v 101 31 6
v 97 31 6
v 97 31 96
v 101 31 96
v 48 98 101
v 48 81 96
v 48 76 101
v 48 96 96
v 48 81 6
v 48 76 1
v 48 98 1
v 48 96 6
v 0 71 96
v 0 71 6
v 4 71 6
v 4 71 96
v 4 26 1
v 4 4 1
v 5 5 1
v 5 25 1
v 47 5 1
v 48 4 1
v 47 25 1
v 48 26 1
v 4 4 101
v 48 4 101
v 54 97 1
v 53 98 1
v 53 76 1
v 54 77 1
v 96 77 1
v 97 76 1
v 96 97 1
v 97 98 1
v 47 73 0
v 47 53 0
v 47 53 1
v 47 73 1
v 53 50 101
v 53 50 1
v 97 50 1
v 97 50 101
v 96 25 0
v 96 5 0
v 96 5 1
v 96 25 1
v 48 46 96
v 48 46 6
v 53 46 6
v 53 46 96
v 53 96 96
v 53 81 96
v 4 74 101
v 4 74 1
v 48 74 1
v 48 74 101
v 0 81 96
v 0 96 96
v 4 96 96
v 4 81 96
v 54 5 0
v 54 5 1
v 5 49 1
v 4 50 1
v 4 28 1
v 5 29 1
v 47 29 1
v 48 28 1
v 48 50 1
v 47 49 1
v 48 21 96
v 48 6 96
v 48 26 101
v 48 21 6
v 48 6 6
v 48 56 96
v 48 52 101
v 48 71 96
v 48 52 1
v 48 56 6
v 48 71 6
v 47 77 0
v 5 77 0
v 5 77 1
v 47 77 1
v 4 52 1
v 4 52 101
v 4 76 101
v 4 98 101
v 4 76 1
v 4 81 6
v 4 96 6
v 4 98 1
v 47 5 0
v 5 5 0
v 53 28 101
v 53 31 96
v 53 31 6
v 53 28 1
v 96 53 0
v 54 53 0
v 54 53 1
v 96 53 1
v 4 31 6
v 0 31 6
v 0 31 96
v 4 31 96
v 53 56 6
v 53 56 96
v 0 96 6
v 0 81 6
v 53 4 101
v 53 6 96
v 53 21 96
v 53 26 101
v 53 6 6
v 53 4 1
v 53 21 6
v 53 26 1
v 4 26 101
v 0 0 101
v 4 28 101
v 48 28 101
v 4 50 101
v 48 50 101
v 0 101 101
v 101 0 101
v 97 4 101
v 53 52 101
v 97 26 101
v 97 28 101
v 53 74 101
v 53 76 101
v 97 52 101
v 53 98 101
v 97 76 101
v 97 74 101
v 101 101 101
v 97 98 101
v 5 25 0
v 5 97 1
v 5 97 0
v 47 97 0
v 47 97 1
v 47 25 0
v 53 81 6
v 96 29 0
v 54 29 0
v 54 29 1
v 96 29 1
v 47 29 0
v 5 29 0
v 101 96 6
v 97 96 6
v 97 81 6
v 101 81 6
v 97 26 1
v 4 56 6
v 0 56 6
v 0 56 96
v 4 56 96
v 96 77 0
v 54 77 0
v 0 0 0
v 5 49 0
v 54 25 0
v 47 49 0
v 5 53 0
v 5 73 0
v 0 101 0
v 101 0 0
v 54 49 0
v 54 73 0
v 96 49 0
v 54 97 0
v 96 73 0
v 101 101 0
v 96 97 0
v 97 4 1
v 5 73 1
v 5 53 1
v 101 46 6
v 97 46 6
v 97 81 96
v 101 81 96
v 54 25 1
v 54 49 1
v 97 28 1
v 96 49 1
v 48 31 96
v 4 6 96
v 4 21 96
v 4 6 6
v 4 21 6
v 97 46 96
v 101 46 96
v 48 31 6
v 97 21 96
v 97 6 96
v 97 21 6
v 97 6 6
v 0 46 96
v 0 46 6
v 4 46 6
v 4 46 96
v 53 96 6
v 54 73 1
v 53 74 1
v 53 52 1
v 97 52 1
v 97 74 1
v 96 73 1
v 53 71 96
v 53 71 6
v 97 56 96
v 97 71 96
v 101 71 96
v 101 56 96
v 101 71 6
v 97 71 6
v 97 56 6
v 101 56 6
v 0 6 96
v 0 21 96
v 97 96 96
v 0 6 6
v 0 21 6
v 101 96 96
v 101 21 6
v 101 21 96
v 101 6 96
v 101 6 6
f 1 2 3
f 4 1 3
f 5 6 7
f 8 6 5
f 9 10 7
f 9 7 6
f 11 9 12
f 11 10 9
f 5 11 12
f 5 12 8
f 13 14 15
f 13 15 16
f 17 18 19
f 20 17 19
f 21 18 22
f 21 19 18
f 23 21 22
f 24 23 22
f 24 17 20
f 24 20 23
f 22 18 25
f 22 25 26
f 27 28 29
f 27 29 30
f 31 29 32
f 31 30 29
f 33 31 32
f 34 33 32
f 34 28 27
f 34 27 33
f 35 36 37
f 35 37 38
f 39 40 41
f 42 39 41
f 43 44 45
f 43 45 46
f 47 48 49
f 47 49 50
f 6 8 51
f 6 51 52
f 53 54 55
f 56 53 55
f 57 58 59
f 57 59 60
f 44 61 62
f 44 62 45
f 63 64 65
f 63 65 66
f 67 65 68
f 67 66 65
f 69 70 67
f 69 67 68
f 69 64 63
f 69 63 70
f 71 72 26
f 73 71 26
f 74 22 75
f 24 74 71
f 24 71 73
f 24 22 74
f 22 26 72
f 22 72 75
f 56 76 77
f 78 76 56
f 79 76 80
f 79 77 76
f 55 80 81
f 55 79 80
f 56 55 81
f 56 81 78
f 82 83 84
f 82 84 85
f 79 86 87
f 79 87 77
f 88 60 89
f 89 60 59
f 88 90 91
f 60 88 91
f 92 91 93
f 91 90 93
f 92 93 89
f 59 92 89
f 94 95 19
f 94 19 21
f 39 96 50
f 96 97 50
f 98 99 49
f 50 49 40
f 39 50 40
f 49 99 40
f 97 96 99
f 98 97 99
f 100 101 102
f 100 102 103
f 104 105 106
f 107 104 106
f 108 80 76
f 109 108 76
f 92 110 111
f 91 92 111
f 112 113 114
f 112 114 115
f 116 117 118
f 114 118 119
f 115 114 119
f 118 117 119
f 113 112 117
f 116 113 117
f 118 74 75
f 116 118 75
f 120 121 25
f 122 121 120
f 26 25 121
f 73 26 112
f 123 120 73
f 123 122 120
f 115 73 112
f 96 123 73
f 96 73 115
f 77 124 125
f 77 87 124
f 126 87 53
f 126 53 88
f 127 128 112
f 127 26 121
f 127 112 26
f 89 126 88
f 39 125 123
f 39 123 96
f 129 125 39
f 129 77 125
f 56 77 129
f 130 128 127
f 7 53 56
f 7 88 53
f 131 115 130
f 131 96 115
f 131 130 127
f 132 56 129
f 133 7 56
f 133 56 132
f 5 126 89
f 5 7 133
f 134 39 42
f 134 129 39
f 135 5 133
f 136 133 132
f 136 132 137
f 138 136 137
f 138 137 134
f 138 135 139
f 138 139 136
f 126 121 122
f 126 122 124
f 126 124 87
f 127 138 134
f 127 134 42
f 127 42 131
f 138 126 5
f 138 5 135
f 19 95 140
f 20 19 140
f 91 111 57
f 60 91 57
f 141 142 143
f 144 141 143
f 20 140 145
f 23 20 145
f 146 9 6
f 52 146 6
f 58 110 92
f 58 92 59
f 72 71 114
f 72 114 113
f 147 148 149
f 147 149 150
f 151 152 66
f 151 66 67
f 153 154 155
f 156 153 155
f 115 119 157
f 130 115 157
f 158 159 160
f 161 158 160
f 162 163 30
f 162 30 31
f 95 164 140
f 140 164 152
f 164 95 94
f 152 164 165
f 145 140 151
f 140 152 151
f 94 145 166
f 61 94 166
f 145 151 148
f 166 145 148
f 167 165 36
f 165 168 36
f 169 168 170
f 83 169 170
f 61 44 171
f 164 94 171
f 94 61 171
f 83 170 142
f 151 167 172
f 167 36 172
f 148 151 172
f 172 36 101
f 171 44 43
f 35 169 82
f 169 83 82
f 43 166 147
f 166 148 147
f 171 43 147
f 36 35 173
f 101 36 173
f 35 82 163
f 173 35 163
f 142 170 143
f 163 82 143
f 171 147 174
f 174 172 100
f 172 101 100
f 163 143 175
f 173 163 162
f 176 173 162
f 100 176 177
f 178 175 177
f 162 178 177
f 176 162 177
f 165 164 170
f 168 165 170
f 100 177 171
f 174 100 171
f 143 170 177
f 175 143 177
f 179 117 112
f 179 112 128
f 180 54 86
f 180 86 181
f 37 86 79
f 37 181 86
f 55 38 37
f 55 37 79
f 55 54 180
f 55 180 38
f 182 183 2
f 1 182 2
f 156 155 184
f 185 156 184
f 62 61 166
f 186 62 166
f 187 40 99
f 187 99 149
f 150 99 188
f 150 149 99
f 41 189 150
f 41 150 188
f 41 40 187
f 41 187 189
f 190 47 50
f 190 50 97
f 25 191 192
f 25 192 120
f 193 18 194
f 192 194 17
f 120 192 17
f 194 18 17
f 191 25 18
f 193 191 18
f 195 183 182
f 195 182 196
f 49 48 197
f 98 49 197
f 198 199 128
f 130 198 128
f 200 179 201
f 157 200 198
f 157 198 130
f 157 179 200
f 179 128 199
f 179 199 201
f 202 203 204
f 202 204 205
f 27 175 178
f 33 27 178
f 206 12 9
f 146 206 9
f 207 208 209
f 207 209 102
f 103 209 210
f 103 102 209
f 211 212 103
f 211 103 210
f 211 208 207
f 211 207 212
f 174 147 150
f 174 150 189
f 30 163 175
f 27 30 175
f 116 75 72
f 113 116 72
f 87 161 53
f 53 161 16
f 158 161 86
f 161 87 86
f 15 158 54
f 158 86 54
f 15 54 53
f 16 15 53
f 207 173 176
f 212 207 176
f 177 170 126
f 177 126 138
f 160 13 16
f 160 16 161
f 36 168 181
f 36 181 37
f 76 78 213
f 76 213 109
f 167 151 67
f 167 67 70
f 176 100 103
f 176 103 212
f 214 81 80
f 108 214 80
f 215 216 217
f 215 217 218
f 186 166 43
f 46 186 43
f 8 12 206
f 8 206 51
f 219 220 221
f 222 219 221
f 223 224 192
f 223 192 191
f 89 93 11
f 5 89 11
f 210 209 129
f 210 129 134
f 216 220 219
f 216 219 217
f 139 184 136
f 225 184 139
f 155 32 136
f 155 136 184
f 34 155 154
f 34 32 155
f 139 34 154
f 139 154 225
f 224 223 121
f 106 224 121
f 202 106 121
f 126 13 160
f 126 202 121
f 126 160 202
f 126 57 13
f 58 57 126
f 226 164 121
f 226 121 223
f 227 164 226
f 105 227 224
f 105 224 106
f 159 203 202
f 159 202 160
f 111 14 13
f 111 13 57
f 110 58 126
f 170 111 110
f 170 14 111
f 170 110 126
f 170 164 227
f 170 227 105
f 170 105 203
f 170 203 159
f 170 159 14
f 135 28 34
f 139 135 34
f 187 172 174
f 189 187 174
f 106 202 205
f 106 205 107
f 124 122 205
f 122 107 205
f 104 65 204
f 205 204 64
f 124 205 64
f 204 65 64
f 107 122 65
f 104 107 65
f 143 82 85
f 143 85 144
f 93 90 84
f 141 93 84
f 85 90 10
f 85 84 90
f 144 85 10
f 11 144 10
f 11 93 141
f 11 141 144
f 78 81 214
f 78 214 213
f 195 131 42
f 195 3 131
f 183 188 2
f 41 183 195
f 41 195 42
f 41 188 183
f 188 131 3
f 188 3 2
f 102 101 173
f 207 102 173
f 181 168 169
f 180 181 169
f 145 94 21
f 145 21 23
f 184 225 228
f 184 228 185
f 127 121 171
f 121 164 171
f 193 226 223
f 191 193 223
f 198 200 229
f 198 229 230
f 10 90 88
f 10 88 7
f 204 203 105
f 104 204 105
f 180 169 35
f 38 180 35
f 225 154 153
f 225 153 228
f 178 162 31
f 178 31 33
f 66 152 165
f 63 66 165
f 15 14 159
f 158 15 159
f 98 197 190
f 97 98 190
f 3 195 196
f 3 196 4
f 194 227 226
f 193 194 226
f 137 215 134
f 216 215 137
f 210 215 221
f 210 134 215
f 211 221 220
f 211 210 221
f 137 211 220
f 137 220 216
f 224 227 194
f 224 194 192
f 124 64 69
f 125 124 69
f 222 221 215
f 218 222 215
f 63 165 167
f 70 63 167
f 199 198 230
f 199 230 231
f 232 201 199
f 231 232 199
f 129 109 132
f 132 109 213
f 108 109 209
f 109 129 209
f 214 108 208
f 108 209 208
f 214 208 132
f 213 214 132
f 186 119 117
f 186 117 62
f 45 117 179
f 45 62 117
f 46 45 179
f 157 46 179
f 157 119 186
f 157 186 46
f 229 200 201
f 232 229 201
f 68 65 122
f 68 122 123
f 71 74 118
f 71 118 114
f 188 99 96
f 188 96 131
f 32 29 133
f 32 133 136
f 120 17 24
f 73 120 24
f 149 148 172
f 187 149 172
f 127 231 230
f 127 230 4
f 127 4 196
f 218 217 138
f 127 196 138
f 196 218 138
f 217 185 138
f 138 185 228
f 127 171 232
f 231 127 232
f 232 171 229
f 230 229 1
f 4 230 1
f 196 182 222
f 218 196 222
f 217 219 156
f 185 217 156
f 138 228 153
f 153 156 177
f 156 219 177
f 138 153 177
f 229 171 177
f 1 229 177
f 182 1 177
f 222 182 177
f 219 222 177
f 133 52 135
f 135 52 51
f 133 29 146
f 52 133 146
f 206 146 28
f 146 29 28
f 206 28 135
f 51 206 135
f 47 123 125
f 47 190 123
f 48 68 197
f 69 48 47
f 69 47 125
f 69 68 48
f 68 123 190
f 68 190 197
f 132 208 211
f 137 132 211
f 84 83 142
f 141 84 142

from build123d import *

# Parameters (mm, degrees)
F0_W     = 101
F0_H     = 101
F0_W_2   = 42
F0_H_2   = 20
F1_DEPTH = 1
F2_W     = 101
F2_H     = 101
F2_W_2   = 44
F2_H_2   = 22
F3_DEPTH = 100
F4_W     = 15
F4_H     = 90
F5_DEPTH = 101.001


with BuildPart() as f1:
    # F0 (on Top) → F1 (new body)
    with BuildSketch(Plane.XY):
        with Locations((50.5, 50.5)):
            Rectangle(F0_W, F0_H)
        with Locations((26, 15)):
            Rectangle(F0_W_2, F0_H_2, mode=Mode.SUBTRACT)
        with Locations((26, 39)):
            Rectangle(F0_W_2, F0_H_2, mode=Mode.SUBTRACT)
        with Locations((75, 15)):
            Rectangle(F0_W_2, F0_H_2, mode=Mode.SUBTRACT)
        with Locations((75, 39)):
            Rectangle(F0_W_2, F0_H_2, mode=Mode.SUBTRACT)
        with Locations((26, 63)):
            Rectangle(F0_W_2, F0_H_2, mode=Mode.SUBTRACT)
        with Locations((26, 87)):
            Rectangle(F0_W_2, F0_H_2, mode=Mode.SUBTRACT)
        with Locations((75, 63)):
            Rectangle(F0_W_2, F0_H_2, mode=Mode.SUBTRACT)
        with Locations((75, 87)):
            Rectangle(F0_W_2, F0_H_2, mode=Mode.SUBTRACT)
    extrude(amount=F1_DEPTH)

    # F2 (on face) → F3 (join)
    with BuildSketch(Plane.XY.offset(1)):
        with Locations((50.5, 50.5)):
            Rectangle(F2_W, F2_H)
        with Locations((26, 15)):
            Rectangle(F2_W_2, F2_H_2, mode=Mode.SUBTRACT)
        with Locations((26, 39)):
            Rectangle(F2_W_2, F2_H_2, mode=Mode.SUBTRACT)
        with Locations((75, 15)):
            Rectangle(F2_W_2, F2_H_2, mode=Mode.SUBTRACT)
        with Locations((75, 39)):
            Rectangle(F2_W_2, F2_H_2, mode=Mode.SUBTRACT)
        with Locations((26, 63)):
            Rectangle(F2_W_2, F2_H_2, mode=Mode.SUBTRACT)
        with Locations((26, 87)):
            Rectangle(F2_W_2, F2_H_2, mode=Mode.SUBTRACT)
        with Locations((75, 63)):
            Rectangle(F2_W_2, F2_H_2, mode=Mode.SUBTRACT)
        with Locations((75, 87)):
            Rectangle(F2_W_2, F2_H_2, mode=Mode.SUBTRACT)
    extrude(amount=F3_DEPTH)

    # F4 (on face) → F5 (cut, through all)
    with BuildSketch(Plane(origin=(0, 0, 0), x_dir=(0, -1, 0), z_dir=(-1, 0, 0))):
        with Locations((-88.5, 51)):
            Rectangle(F4_W, F4_H)
        with Locations((-63.5, 51)):
            Rectangle(F4_W, F4_H)
        with Locations((-38.5, 51)):
            Rectangle(F4_W, F4_H)
        with Locations((-13.5, 51)):
            Rectangle(F4_W, F4_H)
    extrude(amount=-F5_DEPTH, mode=Mode.SUBTRACT)


solid = f1.part
